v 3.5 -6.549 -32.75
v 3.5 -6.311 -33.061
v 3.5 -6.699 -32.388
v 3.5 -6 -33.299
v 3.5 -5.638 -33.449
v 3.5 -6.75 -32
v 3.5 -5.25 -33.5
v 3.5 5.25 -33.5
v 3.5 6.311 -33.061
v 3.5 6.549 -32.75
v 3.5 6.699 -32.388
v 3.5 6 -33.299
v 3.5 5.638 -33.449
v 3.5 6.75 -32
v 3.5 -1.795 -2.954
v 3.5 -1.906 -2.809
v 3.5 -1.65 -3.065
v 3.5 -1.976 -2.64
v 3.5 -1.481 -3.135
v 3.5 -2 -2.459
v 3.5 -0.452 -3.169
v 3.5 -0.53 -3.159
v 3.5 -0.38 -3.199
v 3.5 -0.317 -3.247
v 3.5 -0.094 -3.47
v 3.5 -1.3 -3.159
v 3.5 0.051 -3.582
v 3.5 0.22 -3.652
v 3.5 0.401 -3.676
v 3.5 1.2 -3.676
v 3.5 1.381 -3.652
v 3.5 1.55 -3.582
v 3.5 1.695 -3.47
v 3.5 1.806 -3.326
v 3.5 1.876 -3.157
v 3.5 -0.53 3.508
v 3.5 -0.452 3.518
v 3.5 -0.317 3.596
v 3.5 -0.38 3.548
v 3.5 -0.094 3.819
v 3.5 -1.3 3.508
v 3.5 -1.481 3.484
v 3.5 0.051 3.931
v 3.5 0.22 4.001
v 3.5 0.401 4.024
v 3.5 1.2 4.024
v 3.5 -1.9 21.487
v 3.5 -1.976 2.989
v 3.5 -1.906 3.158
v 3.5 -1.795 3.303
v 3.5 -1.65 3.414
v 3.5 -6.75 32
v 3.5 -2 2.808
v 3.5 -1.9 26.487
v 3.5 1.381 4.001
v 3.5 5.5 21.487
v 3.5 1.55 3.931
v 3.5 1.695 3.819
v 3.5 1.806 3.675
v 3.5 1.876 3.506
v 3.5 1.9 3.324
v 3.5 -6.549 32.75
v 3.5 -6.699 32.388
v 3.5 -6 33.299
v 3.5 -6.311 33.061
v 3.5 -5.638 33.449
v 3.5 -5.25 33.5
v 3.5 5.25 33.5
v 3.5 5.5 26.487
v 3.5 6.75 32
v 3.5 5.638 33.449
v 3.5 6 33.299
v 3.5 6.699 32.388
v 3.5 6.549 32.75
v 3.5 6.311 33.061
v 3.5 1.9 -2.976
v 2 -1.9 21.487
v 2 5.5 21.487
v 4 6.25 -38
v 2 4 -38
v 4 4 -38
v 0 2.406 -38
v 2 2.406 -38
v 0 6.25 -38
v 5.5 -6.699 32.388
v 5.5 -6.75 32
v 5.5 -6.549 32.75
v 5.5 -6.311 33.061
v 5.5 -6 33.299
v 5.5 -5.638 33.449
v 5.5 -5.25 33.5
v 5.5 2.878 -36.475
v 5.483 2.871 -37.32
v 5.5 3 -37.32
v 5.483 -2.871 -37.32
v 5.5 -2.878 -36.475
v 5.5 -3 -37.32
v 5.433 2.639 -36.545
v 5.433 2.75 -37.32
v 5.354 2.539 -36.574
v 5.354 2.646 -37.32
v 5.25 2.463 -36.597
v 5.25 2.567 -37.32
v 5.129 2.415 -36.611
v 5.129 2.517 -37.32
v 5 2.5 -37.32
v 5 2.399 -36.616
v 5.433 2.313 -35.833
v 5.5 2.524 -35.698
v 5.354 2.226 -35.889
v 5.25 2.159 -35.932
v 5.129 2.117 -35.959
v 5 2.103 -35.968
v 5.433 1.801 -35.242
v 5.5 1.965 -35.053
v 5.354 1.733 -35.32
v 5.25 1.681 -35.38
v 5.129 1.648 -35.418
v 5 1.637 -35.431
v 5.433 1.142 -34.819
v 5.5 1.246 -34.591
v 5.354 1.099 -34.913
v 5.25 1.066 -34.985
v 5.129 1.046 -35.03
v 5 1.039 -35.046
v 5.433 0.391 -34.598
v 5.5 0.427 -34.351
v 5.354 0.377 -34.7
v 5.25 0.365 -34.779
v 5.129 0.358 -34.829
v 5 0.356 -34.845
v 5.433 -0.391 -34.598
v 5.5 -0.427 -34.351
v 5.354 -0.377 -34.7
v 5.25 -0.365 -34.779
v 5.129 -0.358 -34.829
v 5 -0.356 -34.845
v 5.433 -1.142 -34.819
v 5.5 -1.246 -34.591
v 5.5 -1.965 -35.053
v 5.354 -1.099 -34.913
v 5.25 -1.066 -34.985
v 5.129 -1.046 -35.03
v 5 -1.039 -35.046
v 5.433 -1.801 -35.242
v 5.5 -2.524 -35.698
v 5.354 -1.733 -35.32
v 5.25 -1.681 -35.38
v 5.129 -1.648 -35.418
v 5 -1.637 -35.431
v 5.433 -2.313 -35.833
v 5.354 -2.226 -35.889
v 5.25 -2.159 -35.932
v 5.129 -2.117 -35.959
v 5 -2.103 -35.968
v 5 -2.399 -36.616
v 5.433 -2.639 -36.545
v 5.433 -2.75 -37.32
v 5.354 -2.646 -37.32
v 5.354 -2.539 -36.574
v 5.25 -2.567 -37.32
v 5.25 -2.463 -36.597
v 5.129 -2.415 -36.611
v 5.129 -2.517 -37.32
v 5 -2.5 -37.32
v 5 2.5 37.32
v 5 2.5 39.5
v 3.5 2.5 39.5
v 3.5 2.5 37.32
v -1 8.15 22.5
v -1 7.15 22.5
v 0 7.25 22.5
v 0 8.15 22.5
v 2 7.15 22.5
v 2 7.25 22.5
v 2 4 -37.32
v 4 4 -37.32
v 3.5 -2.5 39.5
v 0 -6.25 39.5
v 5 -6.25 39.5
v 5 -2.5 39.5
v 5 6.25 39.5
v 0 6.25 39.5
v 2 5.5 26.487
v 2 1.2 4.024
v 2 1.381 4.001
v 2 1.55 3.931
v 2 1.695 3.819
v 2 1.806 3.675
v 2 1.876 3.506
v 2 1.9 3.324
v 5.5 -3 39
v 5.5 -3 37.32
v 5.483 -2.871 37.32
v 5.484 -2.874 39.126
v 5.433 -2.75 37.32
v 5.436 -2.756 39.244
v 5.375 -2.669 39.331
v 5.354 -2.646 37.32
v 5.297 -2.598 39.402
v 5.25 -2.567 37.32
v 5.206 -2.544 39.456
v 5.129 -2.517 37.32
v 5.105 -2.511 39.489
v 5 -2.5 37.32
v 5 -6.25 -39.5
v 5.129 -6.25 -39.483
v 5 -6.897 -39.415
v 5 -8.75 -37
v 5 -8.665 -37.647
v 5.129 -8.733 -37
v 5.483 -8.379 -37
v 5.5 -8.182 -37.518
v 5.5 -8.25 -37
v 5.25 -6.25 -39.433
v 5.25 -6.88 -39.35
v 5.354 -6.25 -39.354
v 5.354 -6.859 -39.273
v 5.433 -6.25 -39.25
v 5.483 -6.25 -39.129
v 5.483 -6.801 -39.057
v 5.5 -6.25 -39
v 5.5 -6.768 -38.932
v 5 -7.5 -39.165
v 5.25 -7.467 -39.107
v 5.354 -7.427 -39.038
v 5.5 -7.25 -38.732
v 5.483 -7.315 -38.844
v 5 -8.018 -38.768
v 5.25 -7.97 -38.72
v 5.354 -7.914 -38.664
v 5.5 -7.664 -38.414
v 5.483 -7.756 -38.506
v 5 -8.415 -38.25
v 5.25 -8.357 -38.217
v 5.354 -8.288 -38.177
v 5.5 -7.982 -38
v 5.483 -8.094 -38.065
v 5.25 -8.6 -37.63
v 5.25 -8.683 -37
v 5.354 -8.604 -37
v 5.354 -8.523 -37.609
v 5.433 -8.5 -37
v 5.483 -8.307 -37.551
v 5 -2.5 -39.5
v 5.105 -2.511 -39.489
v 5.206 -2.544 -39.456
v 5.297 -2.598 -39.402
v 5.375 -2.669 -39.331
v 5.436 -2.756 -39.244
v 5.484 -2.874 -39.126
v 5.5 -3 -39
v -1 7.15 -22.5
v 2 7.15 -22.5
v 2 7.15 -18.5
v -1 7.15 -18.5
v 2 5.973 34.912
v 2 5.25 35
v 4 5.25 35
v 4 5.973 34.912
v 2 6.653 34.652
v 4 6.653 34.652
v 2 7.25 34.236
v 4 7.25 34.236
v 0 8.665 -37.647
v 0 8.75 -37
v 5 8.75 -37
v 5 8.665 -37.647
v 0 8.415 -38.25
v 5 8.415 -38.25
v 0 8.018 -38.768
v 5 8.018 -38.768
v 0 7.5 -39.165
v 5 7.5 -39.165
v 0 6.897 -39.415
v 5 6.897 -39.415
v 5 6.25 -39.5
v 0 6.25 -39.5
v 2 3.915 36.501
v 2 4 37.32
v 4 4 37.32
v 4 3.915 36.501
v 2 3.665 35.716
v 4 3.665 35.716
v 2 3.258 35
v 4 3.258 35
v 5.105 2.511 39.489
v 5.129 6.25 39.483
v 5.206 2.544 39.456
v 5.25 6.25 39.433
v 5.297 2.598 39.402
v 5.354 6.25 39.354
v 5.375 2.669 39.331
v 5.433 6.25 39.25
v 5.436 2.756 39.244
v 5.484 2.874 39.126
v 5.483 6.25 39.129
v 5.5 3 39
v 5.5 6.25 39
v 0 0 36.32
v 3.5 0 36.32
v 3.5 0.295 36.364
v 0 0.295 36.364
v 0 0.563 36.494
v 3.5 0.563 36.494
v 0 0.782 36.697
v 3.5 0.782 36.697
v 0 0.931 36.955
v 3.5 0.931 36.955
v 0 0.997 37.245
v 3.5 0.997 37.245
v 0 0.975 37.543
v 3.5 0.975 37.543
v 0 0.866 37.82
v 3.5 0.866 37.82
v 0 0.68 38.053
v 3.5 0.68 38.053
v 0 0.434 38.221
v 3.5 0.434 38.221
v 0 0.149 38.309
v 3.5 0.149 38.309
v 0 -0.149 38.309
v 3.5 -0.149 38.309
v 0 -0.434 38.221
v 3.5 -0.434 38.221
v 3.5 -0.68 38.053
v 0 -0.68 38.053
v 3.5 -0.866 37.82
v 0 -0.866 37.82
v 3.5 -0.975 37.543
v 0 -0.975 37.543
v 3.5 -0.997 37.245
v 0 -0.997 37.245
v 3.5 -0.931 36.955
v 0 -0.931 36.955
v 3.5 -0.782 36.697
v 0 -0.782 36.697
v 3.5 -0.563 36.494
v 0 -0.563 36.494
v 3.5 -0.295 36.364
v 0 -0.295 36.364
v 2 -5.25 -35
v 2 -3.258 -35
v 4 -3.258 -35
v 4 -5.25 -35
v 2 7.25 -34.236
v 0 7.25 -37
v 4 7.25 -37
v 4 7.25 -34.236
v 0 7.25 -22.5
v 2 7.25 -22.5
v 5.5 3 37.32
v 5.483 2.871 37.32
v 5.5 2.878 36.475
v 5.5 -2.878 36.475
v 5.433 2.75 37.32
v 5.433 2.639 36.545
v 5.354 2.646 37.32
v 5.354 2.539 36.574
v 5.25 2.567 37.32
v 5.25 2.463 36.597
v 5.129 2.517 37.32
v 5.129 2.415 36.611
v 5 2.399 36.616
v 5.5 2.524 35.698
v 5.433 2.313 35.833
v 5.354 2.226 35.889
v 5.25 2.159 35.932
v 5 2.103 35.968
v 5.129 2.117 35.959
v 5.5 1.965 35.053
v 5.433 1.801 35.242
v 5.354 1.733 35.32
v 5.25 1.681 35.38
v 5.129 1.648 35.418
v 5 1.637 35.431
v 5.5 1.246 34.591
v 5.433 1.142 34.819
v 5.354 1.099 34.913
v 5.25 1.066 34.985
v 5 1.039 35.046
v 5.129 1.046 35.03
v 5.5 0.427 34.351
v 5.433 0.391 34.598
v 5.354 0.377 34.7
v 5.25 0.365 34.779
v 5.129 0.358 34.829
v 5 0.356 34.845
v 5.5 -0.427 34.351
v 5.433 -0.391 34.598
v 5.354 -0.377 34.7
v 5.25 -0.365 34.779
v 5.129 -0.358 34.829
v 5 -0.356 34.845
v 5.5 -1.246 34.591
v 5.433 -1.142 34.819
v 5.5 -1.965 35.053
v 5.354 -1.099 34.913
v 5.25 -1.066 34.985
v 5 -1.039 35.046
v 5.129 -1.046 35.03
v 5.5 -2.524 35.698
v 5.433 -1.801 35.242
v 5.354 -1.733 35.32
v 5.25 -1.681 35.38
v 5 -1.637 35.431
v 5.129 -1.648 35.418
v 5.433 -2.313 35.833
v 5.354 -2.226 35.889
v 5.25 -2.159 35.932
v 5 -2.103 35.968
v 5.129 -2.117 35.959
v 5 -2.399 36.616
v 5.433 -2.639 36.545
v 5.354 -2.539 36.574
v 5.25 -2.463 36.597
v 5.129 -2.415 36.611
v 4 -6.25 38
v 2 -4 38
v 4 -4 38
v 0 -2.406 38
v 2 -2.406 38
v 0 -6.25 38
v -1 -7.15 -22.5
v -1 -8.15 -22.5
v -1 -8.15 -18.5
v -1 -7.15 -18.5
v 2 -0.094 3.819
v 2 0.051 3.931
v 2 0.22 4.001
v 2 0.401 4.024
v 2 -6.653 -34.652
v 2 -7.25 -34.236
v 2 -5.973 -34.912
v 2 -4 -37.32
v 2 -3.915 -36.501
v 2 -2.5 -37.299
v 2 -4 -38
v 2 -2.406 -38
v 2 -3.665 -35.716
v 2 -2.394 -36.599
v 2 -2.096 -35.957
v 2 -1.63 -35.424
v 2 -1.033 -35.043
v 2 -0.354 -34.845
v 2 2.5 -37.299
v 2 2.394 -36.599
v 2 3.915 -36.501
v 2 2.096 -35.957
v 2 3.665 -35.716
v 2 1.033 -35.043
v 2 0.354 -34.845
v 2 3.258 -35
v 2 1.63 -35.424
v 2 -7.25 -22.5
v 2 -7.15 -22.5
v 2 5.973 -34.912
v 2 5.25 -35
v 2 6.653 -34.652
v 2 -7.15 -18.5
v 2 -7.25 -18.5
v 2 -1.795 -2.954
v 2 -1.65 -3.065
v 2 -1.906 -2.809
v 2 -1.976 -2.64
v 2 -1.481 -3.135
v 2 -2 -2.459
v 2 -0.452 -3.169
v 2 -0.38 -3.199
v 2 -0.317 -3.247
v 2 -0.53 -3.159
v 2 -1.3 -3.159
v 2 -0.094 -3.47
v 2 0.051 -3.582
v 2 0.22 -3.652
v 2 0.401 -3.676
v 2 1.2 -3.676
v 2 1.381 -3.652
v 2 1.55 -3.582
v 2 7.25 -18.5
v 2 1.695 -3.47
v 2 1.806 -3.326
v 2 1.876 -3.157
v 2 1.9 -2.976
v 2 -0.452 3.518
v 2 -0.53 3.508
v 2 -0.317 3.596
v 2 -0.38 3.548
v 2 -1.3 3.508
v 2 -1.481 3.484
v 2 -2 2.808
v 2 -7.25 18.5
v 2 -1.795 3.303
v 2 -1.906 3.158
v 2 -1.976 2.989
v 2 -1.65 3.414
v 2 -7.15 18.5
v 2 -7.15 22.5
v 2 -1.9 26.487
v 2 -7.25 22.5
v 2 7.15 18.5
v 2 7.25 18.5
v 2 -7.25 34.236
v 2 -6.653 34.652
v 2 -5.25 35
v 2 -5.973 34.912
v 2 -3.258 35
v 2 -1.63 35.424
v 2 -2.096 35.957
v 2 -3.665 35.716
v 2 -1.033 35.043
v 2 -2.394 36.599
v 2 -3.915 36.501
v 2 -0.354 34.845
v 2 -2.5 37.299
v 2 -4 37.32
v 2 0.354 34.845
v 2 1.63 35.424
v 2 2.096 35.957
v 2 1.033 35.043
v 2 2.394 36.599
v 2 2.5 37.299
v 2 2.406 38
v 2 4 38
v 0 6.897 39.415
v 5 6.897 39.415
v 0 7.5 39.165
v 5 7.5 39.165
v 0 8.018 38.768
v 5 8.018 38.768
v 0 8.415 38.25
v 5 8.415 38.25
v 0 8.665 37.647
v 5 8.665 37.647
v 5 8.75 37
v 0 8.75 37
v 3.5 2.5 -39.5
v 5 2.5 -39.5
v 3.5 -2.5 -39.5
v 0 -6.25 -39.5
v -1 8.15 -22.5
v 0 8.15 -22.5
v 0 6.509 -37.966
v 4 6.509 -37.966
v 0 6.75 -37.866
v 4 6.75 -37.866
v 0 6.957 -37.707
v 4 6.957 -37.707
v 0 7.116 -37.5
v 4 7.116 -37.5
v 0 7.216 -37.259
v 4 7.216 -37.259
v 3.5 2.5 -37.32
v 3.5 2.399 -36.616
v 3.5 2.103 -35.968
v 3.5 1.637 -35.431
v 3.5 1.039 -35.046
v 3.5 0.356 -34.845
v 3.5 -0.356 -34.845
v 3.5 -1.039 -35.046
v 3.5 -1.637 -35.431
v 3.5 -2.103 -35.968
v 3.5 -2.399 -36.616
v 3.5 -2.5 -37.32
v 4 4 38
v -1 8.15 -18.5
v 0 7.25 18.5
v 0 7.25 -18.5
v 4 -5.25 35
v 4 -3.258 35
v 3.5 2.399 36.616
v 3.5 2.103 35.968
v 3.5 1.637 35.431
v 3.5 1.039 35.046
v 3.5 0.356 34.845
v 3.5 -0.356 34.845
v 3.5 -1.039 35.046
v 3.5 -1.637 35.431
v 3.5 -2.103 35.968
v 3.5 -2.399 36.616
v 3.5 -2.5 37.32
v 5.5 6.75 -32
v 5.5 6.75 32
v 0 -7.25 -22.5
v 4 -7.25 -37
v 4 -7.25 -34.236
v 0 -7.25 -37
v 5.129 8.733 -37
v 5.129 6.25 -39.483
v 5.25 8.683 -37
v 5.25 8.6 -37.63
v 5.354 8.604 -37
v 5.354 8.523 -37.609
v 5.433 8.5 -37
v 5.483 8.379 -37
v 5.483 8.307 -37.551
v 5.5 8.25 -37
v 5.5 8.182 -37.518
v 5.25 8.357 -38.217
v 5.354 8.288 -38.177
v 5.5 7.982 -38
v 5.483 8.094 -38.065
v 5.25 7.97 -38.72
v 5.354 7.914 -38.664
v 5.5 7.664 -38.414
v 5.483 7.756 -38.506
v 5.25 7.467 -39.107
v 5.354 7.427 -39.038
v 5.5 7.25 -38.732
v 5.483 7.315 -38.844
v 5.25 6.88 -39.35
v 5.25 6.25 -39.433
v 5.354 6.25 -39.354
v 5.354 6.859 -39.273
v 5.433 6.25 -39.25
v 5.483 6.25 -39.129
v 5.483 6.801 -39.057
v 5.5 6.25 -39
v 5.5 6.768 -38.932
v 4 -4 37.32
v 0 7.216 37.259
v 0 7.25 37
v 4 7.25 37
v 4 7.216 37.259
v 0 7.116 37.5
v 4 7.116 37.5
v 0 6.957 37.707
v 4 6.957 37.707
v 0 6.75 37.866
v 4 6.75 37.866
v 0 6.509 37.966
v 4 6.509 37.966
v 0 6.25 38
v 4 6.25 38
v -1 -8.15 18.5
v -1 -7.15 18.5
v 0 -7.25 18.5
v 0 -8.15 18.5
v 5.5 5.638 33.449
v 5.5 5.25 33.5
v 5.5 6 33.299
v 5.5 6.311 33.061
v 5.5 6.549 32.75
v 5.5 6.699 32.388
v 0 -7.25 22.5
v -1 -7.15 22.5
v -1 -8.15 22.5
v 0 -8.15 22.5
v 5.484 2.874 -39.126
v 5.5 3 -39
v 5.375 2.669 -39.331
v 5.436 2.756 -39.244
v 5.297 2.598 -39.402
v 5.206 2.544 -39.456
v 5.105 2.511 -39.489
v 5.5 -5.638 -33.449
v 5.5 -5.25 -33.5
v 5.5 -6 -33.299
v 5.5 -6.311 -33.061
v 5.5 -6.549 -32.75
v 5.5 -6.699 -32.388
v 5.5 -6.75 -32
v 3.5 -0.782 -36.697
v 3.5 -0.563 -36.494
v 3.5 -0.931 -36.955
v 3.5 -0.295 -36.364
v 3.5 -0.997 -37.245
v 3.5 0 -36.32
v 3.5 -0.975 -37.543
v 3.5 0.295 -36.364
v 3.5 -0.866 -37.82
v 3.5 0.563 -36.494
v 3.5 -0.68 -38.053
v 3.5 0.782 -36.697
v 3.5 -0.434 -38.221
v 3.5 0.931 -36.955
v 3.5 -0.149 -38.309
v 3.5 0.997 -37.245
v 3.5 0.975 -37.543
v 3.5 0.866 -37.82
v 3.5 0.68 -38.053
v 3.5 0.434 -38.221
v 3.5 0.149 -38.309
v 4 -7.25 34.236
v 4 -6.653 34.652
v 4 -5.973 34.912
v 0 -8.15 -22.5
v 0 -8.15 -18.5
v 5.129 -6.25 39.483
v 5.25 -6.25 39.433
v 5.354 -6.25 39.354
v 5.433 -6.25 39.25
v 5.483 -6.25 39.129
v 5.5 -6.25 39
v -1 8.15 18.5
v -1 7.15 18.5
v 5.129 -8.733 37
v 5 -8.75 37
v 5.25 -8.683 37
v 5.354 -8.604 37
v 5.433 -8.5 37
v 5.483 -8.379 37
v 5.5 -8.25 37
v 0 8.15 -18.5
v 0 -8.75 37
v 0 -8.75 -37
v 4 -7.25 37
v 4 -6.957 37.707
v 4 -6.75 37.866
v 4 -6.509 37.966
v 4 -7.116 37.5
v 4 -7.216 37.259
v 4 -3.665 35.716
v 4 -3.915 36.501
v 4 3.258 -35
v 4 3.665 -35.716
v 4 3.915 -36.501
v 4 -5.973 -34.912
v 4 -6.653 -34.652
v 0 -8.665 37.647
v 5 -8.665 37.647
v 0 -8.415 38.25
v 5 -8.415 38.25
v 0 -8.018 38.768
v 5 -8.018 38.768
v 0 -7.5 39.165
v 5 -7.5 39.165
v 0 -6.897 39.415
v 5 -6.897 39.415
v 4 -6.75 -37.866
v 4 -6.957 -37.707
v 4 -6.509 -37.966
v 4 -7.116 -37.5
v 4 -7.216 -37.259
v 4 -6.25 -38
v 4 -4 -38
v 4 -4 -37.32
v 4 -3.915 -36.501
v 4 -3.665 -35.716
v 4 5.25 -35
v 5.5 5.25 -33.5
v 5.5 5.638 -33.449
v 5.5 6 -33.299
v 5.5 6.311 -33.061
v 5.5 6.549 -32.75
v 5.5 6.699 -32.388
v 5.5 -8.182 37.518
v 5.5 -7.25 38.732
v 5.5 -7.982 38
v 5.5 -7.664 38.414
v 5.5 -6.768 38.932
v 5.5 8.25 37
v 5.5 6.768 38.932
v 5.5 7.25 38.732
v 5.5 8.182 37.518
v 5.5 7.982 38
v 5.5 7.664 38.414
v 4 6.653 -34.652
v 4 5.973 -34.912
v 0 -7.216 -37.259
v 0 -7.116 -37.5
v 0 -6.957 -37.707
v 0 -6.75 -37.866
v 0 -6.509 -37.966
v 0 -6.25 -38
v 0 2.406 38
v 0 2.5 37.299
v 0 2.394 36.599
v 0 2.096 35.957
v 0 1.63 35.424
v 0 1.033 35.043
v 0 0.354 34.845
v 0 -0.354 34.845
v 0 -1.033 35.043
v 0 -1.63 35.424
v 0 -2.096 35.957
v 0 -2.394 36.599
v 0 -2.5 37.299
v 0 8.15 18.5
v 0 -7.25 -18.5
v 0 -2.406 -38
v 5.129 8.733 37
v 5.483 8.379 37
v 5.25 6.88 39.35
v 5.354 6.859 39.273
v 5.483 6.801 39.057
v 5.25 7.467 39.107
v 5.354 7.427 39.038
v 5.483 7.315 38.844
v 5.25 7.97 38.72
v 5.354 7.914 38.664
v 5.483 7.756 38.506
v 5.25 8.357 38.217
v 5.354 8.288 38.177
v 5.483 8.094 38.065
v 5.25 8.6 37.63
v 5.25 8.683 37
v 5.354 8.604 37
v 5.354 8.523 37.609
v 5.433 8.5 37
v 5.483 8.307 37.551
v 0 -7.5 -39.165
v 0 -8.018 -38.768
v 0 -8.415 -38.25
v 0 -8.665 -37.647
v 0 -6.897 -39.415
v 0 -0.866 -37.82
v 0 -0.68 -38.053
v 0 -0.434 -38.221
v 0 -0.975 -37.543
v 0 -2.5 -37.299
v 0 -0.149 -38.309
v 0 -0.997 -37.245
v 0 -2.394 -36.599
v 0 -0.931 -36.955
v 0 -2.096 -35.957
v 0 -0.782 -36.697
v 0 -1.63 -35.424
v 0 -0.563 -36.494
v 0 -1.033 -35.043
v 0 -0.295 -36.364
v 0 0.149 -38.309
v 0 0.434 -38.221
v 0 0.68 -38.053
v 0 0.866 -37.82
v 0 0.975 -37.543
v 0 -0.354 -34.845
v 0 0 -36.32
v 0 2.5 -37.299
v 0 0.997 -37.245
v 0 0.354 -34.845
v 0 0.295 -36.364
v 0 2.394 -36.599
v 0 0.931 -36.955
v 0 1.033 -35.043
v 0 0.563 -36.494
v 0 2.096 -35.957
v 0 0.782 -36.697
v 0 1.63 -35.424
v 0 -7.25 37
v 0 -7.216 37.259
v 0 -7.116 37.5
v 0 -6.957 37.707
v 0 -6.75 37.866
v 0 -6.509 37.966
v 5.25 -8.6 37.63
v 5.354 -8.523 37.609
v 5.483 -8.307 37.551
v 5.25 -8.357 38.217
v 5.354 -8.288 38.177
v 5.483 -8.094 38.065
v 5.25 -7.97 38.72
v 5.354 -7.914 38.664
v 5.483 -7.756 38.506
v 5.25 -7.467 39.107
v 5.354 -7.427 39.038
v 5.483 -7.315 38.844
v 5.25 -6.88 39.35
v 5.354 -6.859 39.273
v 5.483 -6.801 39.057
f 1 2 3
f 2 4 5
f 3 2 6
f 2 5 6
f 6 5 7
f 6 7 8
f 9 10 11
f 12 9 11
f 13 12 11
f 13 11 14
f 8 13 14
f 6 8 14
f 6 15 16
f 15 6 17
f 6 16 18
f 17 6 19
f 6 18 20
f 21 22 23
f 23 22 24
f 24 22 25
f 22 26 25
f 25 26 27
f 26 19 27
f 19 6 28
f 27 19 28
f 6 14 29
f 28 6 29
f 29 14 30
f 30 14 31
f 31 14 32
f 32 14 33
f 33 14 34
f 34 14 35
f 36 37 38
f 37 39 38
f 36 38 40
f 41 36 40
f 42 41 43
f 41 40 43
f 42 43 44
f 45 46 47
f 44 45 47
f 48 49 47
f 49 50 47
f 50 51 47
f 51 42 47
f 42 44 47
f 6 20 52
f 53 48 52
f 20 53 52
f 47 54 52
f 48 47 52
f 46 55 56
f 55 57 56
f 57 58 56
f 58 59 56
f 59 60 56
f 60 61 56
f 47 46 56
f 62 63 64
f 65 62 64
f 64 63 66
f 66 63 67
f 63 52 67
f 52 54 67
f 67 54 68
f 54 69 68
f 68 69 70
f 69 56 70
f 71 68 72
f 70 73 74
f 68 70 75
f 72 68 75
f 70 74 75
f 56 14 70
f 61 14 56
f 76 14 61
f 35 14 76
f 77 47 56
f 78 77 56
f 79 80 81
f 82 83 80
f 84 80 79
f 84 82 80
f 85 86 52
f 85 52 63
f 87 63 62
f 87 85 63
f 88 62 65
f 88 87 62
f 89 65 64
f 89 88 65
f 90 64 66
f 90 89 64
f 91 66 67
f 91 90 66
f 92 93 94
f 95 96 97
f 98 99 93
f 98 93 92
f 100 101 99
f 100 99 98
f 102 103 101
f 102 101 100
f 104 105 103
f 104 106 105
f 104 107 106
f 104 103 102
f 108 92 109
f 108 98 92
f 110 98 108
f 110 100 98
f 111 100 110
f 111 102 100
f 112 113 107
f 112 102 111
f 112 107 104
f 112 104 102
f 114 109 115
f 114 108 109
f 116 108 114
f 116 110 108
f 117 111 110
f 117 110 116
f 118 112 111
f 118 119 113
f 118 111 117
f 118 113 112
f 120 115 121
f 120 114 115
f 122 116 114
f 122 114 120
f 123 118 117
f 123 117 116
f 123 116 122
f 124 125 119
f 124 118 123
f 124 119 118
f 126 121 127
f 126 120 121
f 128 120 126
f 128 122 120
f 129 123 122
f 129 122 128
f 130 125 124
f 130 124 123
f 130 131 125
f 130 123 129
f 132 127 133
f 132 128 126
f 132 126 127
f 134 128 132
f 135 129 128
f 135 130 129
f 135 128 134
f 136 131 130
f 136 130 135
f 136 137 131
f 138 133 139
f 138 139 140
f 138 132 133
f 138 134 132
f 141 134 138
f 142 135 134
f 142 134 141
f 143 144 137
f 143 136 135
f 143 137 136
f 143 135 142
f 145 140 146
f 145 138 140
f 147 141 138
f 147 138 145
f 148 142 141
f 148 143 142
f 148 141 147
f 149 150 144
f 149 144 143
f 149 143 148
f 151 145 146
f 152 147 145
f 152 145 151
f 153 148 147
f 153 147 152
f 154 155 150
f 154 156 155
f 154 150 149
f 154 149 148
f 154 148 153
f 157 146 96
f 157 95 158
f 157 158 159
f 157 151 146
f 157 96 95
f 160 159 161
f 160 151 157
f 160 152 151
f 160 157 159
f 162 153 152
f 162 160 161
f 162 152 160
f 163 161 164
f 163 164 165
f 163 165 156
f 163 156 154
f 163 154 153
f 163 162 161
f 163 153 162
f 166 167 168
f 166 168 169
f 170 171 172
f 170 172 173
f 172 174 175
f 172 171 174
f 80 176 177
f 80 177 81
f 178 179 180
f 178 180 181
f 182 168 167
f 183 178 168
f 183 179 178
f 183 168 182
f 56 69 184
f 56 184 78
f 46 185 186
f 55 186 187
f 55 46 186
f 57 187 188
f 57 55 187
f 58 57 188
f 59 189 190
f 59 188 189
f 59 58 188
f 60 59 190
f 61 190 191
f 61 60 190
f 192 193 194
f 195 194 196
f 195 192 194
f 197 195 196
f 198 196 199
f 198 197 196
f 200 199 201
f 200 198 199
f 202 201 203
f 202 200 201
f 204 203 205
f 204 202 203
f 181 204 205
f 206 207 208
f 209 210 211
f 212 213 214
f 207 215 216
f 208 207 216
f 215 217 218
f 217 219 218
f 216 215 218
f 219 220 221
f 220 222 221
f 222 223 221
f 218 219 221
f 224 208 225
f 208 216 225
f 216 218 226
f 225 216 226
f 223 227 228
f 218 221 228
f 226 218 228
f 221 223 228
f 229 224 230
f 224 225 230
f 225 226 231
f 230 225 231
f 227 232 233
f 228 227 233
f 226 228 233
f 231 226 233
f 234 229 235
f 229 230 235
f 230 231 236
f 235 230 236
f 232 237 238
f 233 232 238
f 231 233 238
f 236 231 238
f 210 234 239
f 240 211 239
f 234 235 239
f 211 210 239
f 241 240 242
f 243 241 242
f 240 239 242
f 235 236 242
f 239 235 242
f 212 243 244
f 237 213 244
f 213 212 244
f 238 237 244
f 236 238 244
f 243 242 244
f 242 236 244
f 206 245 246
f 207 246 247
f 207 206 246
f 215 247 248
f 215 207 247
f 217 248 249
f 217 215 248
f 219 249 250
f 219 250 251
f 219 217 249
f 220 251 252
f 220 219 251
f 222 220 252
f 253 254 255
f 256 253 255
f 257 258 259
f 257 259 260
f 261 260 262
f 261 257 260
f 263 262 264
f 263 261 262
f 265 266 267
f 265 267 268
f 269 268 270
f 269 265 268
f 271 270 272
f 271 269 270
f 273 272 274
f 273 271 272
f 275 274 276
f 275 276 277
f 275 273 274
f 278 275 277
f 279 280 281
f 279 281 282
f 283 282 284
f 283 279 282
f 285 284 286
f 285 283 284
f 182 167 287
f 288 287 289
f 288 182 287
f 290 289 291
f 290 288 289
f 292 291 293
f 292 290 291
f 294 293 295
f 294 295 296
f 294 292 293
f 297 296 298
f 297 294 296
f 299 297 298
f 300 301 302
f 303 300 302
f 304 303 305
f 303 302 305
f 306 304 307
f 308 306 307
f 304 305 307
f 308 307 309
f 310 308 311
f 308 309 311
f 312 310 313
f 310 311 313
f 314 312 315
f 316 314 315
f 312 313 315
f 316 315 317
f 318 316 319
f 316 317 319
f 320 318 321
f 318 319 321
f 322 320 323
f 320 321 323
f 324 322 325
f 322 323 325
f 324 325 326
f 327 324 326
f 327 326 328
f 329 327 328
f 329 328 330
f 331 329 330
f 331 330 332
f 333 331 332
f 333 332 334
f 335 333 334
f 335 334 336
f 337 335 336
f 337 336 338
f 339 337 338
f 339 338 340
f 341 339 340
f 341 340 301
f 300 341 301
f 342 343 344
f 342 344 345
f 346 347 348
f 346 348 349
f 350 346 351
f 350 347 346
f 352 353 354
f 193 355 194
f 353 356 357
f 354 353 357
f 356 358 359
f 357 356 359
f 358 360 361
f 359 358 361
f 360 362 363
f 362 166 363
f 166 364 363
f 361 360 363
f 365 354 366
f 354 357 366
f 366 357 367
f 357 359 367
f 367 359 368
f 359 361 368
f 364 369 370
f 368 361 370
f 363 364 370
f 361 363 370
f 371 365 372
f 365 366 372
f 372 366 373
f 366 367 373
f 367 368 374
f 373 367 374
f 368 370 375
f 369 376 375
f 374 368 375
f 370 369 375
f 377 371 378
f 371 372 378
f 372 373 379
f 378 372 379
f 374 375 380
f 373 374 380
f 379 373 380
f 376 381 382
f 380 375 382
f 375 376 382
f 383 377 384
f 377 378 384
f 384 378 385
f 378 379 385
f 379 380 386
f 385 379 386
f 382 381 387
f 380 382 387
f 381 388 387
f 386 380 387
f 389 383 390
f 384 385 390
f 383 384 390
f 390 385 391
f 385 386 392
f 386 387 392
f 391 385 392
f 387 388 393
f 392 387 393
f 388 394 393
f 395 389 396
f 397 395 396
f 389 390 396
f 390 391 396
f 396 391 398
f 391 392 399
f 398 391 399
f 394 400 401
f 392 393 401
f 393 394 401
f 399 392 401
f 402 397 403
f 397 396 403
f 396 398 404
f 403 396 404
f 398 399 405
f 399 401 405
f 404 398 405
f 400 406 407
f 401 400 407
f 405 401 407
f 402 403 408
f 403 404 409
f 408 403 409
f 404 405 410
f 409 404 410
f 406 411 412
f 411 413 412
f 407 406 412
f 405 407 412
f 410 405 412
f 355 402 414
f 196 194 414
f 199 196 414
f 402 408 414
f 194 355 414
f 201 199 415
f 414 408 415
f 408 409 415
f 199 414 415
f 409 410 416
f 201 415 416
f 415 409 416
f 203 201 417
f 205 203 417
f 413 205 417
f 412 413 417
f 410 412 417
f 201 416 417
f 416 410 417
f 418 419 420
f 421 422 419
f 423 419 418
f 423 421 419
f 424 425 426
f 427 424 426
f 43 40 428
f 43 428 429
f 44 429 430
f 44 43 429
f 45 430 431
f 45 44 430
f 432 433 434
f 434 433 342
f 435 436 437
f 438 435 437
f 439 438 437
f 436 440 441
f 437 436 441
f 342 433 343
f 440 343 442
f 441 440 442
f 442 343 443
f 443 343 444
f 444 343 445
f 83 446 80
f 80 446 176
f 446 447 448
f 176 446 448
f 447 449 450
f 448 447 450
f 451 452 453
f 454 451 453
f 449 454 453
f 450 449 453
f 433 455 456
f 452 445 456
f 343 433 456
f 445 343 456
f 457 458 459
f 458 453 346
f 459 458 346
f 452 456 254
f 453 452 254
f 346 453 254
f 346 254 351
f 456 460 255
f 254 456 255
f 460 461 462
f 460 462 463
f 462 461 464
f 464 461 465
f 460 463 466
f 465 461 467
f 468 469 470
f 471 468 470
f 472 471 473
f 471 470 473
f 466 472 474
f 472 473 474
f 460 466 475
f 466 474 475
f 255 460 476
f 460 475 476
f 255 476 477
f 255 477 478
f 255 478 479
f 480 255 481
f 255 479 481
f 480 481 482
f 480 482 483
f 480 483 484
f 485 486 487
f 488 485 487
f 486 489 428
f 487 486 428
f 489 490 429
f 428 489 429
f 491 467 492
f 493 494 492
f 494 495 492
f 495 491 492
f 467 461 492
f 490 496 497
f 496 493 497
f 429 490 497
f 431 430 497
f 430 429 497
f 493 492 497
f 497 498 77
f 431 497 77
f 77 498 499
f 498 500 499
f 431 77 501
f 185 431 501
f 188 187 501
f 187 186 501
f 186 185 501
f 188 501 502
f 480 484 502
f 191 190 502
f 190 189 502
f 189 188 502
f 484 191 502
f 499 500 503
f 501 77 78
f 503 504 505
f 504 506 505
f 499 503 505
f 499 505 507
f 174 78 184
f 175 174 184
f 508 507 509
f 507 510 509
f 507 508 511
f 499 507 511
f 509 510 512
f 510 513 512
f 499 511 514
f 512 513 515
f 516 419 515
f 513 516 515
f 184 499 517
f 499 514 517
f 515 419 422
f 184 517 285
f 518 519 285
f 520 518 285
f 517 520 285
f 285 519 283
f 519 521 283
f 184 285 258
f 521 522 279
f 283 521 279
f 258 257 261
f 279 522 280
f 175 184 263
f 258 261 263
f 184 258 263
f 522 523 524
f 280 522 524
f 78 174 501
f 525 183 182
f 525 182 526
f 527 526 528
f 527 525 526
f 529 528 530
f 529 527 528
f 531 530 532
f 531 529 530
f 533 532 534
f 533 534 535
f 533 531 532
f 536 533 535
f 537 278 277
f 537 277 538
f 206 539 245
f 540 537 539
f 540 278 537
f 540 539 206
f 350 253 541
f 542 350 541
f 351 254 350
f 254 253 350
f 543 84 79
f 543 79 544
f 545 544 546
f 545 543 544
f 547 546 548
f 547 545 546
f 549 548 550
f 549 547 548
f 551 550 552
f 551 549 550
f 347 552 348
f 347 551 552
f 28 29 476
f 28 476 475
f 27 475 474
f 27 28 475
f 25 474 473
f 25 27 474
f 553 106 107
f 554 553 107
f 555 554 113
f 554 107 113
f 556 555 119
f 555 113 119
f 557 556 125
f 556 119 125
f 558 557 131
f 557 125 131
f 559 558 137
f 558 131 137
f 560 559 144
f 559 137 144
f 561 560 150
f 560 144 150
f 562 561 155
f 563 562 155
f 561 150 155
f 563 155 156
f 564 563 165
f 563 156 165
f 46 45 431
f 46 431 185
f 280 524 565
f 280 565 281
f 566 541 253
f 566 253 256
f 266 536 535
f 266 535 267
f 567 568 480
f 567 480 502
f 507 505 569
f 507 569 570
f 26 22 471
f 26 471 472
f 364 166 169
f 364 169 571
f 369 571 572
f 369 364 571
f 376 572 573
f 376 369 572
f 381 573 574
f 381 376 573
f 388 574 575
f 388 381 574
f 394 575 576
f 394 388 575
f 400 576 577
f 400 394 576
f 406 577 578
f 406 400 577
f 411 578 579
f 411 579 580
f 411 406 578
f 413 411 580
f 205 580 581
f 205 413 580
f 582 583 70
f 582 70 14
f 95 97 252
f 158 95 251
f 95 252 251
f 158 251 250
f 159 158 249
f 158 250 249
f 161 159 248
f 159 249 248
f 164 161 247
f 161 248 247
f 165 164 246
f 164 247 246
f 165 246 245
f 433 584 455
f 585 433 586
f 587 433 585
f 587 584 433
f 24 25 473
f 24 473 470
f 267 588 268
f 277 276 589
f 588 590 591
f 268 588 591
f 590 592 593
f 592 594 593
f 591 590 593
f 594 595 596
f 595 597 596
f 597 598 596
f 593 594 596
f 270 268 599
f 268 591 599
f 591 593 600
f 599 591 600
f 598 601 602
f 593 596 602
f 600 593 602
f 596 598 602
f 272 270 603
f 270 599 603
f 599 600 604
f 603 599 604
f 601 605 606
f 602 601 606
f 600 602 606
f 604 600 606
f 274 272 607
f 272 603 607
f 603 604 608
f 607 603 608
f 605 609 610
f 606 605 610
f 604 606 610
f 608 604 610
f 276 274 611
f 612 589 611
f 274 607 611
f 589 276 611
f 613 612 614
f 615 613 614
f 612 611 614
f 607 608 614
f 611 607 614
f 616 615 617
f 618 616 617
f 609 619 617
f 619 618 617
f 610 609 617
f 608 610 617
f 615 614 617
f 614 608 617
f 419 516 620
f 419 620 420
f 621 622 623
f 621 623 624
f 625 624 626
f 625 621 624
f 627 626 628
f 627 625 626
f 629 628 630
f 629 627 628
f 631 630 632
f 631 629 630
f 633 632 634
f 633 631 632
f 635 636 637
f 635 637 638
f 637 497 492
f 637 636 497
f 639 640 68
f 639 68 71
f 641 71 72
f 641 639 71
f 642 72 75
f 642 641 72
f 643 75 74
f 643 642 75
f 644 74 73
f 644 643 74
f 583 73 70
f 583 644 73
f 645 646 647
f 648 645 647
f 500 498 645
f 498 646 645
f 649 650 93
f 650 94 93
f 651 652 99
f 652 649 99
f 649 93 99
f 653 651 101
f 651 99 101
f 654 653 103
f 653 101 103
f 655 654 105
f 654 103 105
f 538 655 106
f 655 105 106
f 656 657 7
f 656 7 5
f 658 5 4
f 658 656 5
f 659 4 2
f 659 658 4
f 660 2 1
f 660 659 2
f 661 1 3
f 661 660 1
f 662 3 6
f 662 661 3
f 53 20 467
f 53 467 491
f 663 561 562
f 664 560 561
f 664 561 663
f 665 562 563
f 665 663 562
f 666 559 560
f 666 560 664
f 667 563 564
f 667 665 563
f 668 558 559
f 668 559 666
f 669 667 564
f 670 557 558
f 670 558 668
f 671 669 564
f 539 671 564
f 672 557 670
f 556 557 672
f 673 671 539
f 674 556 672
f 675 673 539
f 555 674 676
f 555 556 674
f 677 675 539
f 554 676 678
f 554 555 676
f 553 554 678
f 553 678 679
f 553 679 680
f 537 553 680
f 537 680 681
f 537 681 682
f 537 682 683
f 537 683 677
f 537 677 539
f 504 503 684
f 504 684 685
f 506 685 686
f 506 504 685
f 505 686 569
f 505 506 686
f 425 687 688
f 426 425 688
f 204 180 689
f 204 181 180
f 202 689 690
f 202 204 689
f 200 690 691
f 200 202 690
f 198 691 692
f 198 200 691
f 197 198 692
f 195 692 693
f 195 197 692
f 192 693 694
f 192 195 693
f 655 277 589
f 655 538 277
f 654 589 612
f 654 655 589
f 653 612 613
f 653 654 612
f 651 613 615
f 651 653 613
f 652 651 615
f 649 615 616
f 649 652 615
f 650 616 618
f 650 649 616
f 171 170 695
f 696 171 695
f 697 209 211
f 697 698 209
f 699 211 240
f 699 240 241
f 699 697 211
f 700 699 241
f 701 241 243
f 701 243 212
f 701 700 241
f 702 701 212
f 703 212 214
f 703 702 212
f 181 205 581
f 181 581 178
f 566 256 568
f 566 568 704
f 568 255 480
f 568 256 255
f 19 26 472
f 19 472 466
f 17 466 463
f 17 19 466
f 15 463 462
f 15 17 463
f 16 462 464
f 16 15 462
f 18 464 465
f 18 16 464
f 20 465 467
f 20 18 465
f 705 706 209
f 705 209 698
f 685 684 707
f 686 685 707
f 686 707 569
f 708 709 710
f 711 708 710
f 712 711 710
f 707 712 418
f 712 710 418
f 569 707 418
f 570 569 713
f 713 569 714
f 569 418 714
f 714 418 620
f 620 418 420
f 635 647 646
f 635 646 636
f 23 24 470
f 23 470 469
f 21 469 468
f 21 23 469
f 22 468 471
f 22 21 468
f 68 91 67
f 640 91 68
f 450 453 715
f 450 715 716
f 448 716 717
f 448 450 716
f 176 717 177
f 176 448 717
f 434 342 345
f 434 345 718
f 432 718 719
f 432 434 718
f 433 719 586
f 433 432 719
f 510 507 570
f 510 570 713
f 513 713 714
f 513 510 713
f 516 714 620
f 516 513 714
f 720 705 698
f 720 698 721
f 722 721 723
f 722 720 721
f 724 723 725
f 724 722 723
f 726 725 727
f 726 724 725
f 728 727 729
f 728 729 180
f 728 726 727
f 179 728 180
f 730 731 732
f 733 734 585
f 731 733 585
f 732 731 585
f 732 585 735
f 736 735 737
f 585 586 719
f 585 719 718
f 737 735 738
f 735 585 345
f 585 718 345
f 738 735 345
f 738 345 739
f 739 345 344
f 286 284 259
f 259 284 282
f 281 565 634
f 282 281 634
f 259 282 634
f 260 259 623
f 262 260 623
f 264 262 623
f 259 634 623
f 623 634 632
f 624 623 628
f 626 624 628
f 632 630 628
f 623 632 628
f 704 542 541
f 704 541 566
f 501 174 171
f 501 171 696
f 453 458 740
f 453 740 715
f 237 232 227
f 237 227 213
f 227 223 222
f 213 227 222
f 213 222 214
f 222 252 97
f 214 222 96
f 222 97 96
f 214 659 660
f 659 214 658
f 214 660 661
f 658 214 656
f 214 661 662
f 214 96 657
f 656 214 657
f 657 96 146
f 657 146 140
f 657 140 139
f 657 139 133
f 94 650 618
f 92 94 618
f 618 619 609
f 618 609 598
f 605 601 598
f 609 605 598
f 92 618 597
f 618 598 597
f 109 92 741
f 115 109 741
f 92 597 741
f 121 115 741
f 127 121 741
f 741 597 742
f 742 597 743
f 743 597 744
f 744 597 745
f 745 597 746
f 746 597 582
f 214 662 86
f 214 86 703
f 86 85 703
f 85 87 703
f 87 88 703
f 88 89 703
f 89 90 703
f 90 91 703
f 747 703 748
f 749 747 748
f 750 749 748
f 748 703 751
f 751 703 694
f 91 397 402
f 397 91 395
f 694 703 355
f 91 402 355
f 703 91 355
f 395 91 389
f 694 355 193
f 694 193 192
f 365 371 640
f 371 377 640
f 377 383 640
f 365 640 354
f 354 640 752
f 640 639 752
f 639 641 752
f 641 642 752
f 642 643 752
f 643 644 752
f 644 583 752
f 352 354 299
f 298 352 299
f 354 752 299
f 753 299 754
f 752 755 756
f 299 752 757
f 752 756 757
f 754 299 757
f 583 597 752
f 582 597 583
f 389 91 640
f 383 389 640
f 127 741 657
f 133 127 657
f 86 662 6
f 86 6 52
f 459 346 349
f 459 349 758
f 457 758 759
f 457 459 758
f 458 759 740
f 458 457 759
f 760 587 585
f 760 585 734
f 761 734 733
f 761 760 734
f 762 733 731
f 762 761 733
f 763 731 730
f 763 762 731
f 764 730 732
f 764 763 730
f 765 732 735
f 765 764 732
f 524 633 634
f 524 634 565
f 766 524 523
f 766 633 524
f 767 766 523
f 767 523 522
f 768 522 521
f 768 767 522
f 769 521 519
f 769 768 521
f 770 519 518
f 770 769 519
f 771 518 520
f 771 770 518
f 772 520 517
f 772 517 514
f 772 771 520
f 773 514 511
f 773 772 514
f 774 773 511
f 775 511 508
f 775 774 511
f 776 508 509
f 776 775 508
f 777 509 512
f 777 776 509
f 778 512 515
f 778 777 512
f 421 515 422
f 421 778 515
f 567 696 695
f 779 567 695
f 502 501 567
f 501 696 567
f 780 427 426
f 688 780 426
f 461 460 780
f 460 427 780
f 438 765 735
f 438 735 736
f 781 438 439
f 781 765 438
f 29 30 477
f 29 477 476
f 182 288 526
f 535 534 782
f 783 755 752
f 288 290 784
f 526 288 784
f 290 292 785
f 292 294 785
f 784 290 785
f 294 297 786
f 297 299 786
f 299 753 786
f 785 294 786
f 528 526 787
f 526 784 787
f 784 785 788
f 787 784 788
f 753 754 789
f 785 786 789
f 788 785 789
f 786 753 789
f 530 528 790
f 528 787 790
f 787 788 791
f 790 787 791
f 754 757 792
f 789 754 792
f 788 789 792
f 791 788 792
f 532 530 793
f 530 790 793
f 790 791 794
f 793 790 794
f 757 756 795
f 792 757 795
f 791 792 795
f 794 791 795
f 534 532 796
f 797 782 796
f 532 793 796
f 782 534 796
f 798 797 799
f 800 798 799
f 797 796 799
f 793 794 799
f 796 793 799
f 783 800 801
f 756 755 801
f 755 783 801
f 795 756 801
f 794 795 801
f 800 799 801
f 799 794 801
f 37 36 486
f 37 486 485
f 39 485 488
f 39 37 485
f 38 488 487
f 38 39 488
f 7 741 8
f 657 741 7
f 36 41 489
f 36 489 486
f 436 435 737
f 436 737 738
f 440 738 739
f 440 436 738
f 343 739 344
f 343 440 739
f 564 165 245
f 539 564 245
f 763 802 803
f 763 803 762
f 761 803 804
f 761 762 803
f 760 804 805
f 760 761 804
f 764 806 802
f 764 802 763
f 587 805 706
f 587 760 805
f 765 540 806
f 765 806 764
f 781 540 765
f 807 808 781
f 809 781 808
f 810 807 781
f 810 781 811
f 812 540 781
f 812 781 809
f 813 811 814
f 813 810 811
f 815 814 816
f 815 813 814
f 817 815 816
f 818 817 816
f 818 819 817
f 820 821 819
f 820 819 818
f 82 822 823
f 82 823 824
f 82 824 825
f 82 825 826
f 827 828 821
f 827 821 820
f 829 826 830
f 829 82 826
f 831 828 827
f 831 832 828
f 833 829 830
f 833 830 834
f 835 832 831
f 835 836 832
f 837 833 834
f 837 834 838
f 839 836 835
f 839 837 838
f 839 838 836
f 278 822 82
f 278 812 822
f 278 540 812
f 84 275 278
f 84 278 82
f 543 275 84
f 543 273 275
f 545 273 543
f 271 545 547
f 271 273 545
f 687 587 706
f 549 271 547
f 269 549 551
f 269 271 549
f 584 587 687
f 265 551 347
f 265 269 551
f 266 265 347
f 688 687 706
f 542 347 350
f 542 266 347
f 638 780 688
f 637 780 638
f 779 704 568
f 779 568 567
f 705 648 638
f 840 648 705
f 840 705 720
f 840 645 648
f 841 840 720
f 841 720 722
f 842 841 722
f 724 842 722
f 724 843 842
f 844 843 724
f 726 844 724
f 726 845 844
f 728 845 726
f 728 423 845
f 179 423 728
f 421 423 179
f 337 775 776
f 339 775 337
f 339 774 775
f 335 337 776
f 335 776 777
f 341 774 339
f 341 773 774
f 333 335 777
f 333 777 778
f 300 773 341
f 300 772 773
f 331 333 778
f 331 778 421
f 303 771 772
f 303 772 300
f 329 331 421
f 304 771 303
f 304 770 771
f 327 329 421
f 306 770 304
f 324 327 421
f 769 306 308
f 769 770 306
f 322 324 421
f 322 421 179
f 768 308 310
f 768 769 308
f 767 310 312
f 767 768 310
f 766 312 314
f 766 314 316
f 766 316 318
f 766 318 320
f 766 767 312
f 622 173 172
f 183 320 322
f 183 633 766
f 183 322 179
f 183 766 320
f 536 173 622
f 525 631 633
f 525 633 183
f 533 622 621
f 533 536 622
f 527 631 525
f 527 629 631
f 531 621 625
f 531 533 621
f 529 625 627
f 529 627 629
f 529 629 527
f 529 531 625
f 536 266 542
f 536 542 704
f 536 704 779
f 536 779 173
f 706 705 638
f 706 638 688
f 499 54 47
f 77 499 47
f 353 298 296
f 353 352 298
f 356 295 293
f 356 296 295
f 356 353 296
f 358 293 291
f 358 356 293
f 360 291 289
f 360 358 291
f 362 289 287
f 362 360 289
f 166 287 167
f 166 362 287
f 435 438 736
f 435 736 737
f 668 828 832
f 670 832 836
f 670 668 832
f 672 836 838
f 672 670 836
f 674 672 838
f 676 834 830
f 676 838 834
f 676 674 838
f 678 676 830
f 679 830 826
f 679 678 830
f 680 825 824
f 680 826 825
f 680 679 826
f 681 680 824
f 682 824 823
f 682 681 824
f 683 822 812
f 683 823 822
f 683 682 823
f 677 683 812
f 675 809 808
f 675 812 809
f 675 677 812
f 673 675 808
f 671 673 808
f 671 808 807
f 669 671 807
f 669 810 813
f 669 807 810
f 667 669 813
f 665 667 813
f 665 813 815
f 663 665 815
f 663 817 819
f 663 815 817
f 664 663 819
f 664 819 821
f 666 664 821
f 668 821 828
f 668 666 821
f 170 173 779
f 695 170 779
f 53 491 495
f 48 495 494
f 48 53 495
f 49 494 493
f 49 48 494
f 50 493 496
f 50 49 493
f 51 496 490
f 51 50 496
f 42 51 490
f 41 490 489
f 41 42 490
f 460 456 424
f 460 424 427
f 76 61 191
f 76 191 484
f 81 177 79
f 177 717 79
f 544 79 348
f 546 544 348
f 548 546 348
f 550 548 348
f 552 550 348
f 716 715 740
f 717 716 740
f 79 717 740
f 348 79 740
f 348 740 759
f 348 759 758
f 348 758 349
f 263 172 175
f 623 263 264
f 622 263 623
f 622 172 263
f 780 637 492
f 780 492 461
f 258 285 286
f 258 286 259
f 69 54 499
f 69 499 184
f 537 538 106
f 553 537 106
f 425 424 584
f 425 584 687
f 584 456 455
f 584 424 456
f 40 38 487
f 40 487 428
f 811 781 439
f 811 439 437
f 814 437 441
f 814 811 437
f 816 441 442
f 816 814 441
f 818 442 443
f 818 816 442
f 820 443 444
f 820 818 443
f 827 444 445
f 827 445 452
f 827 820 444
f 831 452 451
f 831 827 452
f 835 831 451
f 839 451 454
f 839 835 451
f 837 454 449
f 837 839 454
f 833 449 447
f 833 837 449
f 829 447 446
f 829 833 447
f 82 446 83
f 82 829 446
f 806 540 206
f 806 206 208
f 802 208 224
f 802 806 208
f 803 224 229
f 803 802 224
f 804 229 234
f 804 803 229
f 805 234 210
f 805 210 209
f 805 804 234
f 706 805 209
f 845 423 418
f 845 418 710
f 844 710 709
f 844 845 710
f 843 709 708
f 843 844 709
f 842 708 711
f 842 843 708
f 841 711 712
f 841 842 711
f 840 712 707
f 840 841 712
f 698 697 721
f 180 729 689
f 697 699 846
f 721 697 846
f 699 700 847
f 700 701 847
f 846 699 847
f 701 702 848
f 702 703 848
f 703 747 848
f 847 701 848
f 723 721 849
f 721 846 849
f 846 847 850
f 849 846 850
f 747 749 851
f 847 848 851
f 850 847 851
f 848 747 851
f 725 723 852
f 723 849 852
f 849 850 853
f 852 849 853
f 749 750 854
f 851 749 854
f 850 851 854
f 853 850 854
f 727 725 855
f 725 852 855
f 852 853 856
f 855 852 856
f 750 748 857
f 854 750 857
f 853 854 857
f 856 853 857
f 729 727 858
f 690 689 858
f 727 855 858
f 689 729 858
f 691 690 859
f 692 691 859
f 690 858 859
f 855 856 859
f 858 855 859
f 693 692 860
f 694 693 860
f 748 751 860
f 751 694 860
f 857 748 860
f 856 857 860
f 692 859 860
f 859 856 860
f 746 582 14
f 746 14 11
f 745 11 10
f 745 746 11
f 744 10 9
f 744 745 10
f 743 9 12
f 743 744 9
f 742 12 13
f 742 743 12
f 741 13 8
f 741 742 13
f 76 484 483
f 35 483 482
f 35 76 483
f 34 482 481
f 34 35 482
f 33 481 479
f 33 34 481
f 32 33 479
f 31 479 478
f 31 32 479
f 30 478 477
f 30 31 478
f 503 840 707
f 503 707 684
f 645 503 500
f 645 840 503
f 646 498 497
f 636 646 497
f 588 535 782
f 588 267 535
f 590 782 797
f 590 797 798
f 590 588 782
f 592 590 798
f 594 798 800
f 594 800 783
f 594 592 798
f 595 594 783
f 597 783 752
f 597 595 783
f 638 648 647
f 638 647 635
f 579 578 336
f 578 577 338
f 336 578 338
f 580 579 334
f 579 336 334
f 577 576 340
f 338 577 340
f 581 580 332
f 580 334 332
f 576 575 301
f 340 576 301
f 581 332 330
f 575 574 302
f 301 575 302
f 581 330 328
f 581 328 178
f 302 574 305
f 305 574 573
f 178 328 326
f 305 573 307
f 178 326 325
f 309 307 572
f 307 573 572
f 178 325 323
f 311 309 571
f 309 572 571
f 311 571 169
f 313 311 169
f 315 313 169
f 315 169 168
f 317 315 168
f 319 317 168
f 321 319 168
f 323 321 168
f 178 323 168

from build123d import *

# Parameters (mm, degrees)
EXTRUIR1_DEPTH            = 5.5
EXTRUIR2_DEPTH            = 2
EXTRUIR3_DEPTH            = 2
CROQUIS5_R                = 1
EXTRUIR4_DEPTH            = 41.608650556
VACIADO1_DEPTH            = 2
VACIADO1_START            = 2
VACIADO1_2_DEPTH          = 2
CROQUIS8_W                = 4
CROQUIS8_H                = 1
EXTRUIR7_DEPTH            = 3
SIMETR_A3_COPY_1_SKETCH_W = 4
SIMETR_A3_COPY_1_SKETCH_H = 1
SIMETR_A3_COPY_1_DEPTH    = 3
REDONDEO1_R               = 0.5
CROQUIS9_W                = 5
CROQUIS9_H                = 7.4
EXTRUIR8_DEPTH            = 41.707032562


# Read off the part's stored shape, not the designer's step: Vaciado1
with BuildPart() as part:
    # Croquis2 → Extruir1 (new body)
    with BuildSketch(Plane(origin=(0, 0, 0), x_dir=(0, 0, -1), z_dir=(1, 0, 0))):
        with BuildLine():
            Line((-37, 8.75), (37, 8.75))
            ThreePointArc((37, 8.75), (38.767766953, 8.017766953), (39.5, 6.25))
            Line((39.5, 6.25), (39.5, -6.25))
            ThreePointArc((39.5, -6.25), (38.767766953, -8.017766953), (37, -8.75))
            Line((37, -8.75), (-37, -8.75))
            ThreePointArc((-37, -8.75), (-38.767766953, -8.017766953), (-39.5, -6.25))
            Line((-39.5, -6.25), (-39.5, 6.25))
            ThreePointArc((-39.5, 6.25), (-38.767766953, 8.017766953), (-37, 8.75))
        make_face()
    extrude(amount=EXTRUIR1_DEPTH)

    # Croquis3 → Extruir2 (cut)
    with BuildSketch(Plane(origin=(5.5, 0, 0), x_dir=(0, 0, -1), z_dir=(1, 0, 0))):
        with BuildLine():
            Line((-32, 6.75), (32, 6.75))
            ThreePointArc((32, 6.75), (33.060660172, 6.310660172), (33.5, 5.25))
            Line((33.5, 5.25), (33.5, -5.25))
            ThreePointArc((33.5, -5.25), (33.060660172, -6.310660172), (32, -6.75))
            Line((32, -6.75), (-32, -6.75))
            ThreePointArc((-32, -6.75), (-33.060660172, -6.310660172), (-33.5, -5.25))
            Line((-33.5, -5.25), (-33.5, 5.25))
            ThreePointArc((-33.5, 5.25), (-33.060660172, 6.310660172), (-32, 6.75))
        make_face()
    extrude(amount=-EXTRUIR2_DEPTH, mode=Mode.SUBTRACT)

    # Croquis4 → Extruir3 (cut)
    with BuildSketch(Plane(origin=(5.5, 0, 0), x_dir=(0, 0, -1), z_dir=(1, 0, 0))):
        with BuildLine():
            Line((-39.5, 2.5), (-37.32, 2.5))
            ThreePointArc((-37.32, 2.5), (-34.82, 0), (-37.32, -2.5))
            Line((-37.32, -2.5), (-39.5, -2.5))
            Line((-39.5, -2.5), (-39.5, 2.5))
        make_face()
    extruir3 = extrude(amount=-EXTRUIR3_DEPTH, mode=Mode.SUBTRACT)

    # Croquis5 → Extruir4 (cut, through all)
    with BuildSketch(Plane(origin=(3.5, 0, 0), x_dir=(0, 0, -1), z_dir=(1, 0, 0))):
        with Locations((-37.32, 0)):
            Circle(CROQUIS5_R)
    extruir4 = extrude(amount=-EXTRUIR4_DEPTH, mode=Mode.SUBTRACT)

    # Simetría1: Extruir3, Extruir4 across plane
    add(extruir3.mirror(Plane.XY), mode=Mode.SUBTRACT)
    add(extruir4.mirror(Plane.XY), mode=Mode.SUBTRACT)

    # Vaciado1 outline → Vaciado1 (cut)
    with BuildSketch(Plane.YZ):
        with BuildLine():
            ThreePointArc((-7.25, -37), (-6.957106781, -37.707106781), (-6.25, -38))
            Line((-6.25, -38), (-2.405743128, -38))
            ThreePointArc((-2.405743128, -38), (0, -34.82), (2.405743128, -38))
            Line((2.405743128, -38), (6.25, -38))
            ThreePointArc((6.25, -38), (6.957106781, -37.707106781), (7.25, -37))
            Line((7.25, -37), (7.25, 37))
            ThreePointArc((7.25, 37), (6.957106781, 37.707106781), (6.25, 38))
            Line((6.25, 38), (2.405743128, 38))
            ThreePointArc((2.405743128, 38), (0, 34.82), (-2.405743128, 38))
            Line((-2.405743128, 38), (-6.25, 38))
            ThreePointArc((-6.25, 38), (-6.957106781, 37.707106781), (-7.25, 37))
            Line((-7.25, 37), (-7.25, -37))
        make_face()
    extrude(amount=VACIADO1_DEPTH, mode=Mode.SUBTRACT)

    # Vaciado1 2 outline → Vaciado1 2 (cut)
    with BuildSketch(Plane.YZ.offset(VACIADO1_START)):
        with BuildLine():
            Line((-7.25, -34.236067977), (-7.25, -37))
            ThreePointArc((-7.25, -37), (-6.957106781, -37.707106781), (-6.25, -38))
            Line((-6.25, -38), (-4, -38))
            Line((-4, -38), (-4, -37.32))
            ThreePointArc((-4, -37.32), (-3.810109158, -36.102187122), (-3.258465897, -35))
            Line((-3.258465897, -35), (-5.25, -35))
            ThreePointArc((-5.25, -35), (-6.320466269, -34.802517077), (-7.25, -34.236067977))
        make_face()
        with BuildLine():
            Line((-7.25, 37), (-7.25, 34.236067977))
            ThreePointArc((-7.25, 34.236067977), (-6.320466269, 34.802517077), (-5.25, 35))
            Line((-5.25, 35), (-3.258465897, 35))
            ThreePointArc((-3.258465897, 35), (-3.810109158, 36.102187122), (-4, 37.32))
            Line((-4, 37.32), (-4, 38))
            Line((-4, 38), (-6.25, 38))
            ThreePointArc((-6.25, 38), (-6.957106781, 37.707106781), (-7.25, 37))
        make_face()
        with BuildLine():
            Line((4, -37.32), (4, -38))
            Line((4, -38), (6.25, -38))
            ThreePointArc((6.25, -38), (6.957106781, -37.707106781), (7.25, -37))
            Line((7.25, -37), (7.25, -34.236067977))
            ThreePointArc((7.25, -34.236067977), (6.320466269, -34.802517077), (5.25, -35))
            Line((5.25, -35), (3.258465897, -35))
            ThreePointArc((3.258465897, -35), (3.810109158, -36.102187122), (4, -37.32))
        make_face()
        with BuildLine():
            Line((6.25, 38), (4, 38))
            Line((4, 38), (4, 37.32))
            ThreePointArc((4, 37.32), (3.810109158, 36.102187122), (3.258465897, 35))
            Line((3.258465897, 35), (5.25, 35))
            ThreePointArc((5.25, 35), (6.320466269, 34.802517077), (7.25, 34.236067977))
            Line((7.25, 34.236067977), (7.25, 37))
            ThreePointArc((7.25, 37), (6.957106781, 37.707106781), (6.25, 38))
        make_face()
    extrude(amount=VACIADO1_2_DEPTH, mode=Mode.SUBTRACT)

    # Croquis8 → Extruir7 (add)
    with BuildSketch(Plane.ZY.offset(-2)):
        with Locations((-20.5, 7.65)):
            Rectangle(CROQUIS8_W, CROQUIS8_H)
    extruir7 = extrude(amount=EXTRUIR7_DEPTH)

    # Simetría2: Extruir7 across plane
    add(extruir7.mirror(Plane.XY))

    # Simetría3: Extruir7 across plane
    add(extruir7.mirror(Plane.ZX))

    # Simetría3 copy 1 sketch → Simetría3 copy 1 (add)
    with BuildSketch(Plane(origin=(2, 0, 0), x_dir=(0, 0, -1), z_dir=(-1, 0, 0))):
        with Locations((-20.5, 7.65)):
            Rectangle(SIMETR_A3_COPY_1_SKETCH_W, SIMETR_A3_COPY_1_SKETCH_H)
    extrude(amount=SIMETR_A3_COPY_1_DEPTH)

    # Redondeo1
    redondeo1_edges = [part.edges().sort_by_distance(p)[0] for p in [
        (5.5, -8.017766953, 38.767766953),
        (5.5, -8.75, 0),
        (5.5, -8.017766953, -38.767766953),
        (5.5, -4.375, -39.5),
        (5.5, 8.017766953, -38.767766953),
        (5.5, 8.75, 0),
        (5.5, 8.017766953, 38.767766953),
        (5.5, -4.375, 39.5),
        (5.5, -2.5, 38.41),
        (5.5, 0, 34.82),
        (5.5, 2.5, 38.41),
        (5.5, 4.375, 39.5),
        (5.5, 4.375, -39.5),
        (5.5, -2.5, -38.41),
        (5.5, 0, -34.82),
        (5.5, 2.5, -38.41),
    ]]
    fillet(redondeo1_edges, radius=REDONDEO1_R)

    # Croquis9 → Extruir8 (cut, through all)
    with BuildSketch(Plane(origin=(3.5, 0, 0), x_dir=(0, 0, -1), z_dir=(1, 0, 0))):
        with Locations((-23.987, 1.8)):
            Rectangle(CROQUIS9_W, CROQUIS9_H)
        with BuildLine():
            Line((-4.0245, 0.401469998), (-4.0245, 1.2))
            ThreePointArc((-4.0245, 1.2), (-3.819474747, 1.694974747), (-3.3245, 1.9))
            Line((-3.3245, 1.9), (2.9755, 1.9))
            ThreePointArc((2.9755, 1.9), (3.470474747, 1.694974747), (3.6755, 1.2))
            Line((3.6755, 1.2), (3.6755, 0.401469998))
            ThreePointArc((3.6755, 0.401469998), (3.622215673, 0.133591595), (3.470474747, -0.093504749))
            Line((3.470474747, -0.093504749), (3.246579496, -0.3174))
            ThreePointArc((3.246579496, -0.3174), (3.18154767, -0.414727005), (3.15871153, -0.529532034))
            Line((3.15871153, -0.529532034), (3.15871153, -1.3))
            ThreePointArc((3.15871153, -1.3), (2.953686277, -1.794974747), (2.45871153, -2))
            Line((2.45871153, -2), (-2.80771153, -2))
            ThreePointArc((-2.80771153, -2), (-3.302686277, -1.794974747), (-3.50771153, -1.3))
            Line((-3.50771153, -1.3), (-3.50771153, -0.529532034))
            ThreePointArc((-3.50771153, -0.529532034), (-3.53054767, -0.414727005), (-3.595579496, -0.3174))
            Line((-3.595579496, -0.3174), (-3.819474747, -0.093504749))
            ThreePointArc((-3.819474747, -0.093504749), (-3.971215673, 0.133591595), (-4.0245, 0.401469998))
        make_face()
    extrude(amount=-EXTRUIR8_DEPTH, mode=Mode.SUBTRACT)


solid = part.part
